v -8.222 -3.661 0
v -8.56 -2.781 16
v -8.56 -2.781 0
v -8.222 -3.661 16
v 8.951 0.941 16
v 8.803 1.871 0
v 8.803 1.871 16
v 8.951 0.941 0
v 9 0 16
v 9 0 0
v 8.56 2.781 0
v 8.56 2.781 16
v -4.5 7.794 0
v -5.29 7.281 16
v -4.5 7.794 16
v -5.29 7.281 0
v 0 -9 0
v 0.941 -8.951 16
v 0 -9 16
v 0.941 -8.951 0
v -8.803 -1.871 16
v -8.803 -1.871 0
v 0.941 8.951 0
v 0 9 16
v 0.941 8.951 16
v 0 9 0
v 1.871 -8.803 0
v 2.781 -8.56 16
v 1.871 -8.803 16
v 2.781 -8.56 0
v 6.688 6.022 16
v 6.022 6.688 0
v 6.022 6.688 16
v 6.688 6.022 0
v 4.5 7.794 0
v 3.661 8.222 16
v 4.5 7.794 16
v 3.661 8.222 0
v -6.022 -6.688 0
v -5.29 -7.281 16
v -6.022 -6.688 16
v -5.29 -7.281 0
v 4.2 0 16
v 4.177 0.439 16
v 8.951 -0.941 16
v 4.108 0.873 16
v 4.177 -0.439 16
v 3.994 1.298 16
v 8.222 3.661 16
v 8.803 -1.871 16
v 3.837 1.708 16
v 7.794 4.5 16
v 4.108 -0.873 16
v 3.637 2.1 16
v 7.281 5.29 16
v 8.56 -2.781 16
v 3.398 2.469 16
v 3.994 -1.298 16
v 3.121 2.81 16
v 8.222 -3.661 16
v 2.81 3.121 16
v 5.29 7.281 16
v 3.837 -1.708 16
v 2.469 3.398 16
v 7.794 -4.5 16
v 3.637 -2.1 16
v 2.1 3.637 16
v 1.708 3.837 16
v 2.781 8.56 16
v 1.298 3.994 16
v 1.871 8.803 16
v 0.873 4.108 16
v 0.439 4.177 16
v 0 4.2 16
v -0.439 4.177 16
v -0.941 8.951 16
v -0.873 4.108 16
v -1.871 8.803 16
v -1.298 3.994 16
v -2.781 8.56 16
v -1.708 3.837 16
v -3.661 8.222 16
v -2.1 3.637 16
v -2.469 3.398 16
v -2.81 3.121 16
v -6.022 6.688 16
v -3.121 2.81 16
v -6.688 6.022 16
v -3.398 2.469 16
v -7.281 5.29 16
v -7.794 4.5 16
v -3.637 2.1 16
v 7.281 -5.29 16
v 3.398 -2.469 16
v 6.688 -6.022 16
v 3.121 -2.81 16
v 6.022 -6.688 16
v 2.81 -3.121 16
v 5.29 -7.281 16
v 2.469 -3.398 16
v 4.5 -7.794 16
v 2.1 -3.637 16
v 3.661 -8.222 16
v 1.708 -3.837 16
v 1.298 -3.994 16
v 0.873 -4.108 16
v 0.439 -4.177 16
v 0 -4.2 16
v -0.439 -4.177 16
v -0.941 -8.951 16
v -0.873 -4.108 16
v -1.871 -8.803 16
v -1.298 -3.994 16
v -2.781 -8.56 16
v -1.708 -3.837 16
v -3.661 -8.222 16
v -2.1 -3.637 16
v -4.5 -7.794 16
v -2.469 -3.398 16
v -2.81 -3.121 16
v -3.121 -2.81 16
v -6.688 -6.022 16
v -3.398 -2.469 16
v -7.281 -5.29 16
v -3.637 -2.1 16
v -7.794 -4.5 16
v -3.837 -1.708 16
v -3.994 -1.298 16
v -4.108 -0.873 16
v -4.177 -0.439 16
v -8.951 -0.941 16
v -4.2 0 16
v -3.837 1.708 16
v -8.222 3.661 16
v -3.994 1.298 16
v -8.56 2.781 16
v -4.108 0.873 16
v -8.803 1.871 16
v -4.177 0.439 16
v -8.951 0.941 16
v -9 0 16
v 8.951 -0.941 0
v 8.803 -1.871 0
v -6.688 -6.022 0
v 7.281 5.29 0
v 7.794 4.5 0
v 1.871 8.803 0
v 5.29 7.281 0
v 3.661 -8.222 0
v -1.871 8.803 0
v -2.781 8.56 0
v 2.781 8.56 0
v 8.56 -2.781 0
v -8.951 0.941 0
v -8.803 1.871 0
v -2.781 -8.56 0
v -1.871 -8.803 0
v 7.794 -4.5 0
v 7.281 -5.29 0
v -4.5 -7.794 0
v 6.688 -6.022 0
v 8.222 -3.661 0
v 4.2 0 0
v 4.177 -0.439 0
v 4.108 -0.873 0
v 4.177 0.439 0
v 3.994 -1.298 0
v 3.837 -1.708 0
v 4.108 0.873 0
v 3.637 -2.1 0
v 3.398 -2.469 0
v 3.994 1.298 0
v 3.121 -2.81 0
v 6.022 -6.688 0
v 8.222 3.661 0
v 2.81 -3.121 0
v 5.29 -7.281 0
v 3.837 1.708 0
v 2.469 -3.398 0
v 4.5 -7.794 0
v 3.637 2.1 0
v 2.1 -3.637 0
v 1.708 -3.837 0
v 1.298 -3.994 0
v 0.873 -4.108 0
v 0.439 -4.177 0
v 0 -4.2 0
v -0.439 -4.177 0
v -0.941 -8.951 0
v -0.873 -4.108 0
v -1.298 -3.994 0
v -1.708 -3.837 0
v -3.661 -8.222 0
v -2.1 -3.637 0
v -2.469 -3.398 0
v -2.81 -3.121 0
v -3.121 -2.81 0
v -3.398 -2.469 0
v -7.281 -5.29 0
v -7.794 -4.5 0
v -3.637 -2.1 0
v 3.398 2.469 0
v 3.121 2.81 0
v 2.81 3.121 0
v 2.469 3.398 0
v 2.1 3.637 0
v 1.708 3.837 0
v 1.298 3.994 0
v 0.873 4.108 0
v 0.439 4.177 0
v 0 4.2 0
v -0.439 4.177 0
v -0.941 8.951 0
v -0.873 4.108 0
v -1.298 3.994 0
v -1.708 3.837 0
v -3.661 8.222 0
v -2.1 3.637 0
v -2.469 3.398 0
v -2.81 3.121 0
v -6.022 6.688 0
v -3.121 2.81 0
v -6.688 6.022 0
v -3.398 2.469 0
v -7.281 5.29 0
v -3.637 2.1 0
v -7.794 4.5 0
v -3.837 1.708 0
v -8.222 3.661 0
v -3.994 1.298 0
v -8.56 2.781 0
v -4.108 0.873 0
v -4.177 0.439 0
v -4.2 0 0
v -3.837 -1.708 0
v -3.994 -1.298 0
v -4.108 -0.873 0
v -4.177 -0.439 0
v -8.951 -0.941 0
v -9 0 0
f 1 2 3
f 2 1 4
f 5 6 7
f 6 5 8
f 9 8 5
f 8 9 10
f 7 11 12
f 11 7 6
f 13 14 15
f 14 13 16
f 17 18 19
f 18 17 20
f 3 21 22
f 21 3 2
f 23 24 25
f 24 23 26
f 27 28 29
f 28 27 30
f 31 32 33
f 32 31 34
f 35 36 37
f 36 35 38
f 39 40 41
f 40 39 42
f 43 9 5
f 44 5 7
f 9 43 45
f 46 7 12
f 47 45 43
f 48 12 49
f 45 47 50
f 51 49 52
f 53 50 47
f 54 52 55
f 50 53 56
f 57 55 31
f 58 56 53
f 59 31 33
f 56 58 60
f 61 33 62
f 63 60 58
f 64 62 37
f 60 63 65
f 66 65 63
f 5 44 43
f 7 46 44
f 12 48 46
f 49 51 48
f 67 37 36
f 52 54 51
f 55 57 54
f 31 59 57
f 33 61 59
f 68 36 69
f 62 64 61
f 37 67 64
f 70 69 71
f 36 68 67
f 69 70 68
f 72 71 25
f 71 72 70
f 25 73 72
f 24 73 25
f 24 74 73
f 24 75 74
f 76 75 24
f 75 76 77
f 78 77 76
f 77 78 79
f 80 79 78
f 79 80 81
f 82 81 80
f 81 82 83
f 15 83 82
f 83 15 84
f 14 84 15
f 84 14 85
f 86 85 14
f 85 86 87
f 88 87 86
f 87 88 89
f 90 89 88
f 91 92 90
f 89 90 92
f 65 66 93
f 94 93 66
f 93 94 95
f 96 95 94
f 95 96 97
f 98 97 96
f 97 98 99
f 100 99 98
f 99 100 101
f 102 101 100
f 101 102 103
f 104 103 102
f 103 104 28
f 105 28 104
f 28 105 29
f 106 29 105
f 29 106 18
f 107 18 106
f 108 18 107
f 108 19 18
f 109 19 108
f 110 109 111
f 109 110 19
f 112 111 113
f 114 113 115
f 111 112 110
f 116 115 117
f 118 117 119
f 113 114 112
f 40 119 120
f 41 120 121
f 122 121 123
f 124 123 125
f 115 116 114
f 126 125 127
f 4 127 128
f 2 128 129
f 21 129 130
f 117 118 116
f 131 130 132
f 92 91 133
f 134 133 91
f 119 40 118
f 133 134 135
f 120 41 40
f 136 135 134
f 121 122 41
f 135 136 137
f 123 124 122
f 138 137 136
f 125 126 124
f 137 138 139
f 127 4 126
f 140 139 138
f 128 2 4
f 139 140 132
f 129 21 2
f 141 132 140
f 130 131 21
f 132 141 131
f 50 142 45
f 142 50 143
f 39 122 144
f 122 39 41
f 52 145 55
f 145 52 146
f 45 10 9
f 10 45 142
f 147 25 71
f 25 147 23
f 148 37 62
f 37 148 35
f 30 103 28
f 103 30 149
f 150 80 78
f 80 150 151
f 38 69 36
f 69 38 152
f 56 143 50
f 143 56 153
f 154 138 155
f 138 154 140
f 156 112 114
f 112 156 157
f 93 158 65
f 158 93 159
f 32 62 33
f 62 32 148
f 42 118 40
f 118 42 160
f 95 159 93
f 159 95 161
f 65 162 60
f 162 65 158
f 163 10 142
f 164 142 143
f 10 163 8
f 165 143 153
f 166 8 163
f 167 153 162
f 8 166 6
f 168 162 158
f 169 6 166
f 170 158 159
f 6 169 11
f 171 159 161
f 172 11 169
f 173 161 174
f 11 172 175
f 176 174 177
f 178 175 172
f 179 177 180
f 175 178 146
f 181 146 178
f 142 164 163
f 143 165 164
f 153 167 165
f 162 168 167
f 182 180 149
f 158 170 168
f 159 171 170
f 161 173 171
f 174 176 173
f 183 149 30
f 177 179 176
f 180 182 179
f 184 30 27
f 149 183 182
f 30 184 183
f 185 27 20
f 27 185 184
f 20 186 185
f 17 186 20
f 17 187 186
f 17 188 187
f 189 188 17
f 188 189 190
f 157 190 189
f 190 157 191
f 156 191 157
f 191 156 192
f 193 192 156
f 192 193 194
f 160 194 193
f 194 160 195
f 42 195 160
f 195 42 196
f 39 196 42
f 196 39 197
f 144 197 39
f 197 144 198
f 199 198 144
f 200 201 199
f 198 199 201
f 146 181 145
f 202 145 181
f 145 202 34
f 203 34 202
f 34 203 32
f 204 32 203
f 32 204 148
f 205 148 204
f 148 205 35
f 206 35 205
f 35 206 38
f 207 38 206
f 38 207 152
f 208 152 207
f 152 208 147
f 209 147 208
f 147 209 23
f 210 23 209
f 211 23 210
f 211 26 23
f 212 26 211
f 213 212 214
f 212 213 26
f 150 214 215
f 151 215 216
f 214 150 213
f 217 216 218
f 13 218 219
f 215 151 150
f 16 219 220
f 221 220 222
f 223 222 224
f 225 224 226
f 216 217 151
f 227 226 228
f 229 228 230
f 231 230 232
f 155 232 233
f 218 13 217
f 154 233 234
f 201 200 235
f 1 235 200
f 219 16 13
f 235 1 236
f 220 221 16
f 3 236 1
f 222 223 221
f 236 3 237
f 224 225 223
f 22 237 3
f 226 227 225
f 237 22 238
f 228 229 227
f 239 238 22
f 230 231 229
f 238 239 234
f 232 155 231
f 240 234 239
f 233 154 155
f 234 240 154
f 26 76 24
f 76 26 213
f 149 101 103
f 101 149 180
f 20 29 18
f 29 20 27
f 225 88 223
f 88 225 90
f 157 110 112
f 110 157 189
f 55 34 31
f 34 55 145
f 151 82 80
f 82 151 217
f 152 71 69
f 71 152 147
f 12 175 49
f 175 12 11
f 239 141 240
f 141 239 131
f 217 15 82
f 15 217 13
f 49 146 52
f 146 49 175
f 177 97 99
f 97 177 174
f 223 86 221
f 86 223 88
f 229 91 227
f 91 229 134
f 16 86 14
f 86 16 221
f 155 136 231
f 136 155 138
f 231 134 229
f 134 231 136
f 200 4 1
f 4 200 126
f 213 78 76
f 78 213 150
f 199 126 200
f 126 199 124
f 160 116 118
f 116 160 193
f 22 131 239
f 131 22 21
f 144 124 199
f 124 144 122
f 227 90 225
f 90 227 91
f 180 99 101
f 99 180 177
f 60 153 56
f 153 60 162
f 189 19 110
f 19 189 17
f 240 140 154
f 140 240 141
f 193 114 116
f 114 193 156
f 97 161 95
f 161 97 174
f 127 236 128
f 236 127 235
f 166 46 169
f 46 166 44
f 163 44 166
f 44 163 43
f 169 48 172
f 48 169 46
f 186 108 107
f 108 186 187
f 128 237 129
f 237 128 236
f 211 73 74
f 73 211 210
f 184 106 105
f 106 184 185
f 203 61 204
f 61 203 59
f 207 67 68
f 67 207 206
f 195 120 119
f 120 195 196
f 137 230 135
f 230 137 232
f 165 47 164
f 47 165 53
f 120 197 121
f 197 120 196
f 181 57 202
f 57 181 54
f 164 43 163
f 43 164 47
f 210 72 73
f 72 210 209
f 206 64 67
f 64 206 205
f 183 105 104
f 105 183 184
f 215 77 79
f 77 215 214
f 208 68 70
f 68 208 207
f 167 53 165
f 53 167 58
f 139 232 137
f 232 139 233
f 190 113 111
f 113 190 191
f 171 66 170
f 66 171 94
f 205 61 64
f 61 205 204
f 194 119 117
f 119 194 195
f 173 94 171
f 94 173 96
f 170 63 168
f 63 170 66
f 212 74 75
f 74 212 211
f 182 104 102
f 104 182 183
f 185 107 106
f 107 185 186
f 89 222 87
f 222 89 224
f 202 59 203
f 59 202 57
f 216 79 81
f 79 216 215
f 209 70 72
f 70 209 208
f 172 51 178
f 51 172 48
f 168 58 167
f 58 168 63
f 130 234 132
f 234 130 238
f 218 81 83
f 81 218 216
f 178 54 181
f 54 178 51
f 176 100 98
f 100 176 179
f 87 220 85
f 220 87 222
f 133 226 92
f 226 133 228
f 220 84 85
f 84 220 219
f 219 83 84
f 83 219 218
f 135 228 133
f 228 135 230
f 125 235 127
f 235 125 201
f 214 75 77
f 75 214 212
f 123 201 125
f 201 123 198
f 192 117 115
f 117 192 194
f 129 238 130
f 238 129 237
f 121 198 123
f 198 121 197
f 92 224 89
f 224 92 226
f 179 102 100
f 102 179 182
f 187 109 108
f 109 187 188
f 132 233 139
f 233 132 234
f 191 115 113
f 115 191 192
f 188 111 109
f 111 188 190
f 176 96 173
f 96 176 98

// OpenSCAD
// Round spacer.
$fn = 60;
eps = 0.02;
inner_d = 8.4;
outer_d = 18;
length = 16;
difference() { cylinder(d=outer_d,h=length); translate([0,0,-eps]) cylinder(d=inner_d,h=length+2*eps); }
